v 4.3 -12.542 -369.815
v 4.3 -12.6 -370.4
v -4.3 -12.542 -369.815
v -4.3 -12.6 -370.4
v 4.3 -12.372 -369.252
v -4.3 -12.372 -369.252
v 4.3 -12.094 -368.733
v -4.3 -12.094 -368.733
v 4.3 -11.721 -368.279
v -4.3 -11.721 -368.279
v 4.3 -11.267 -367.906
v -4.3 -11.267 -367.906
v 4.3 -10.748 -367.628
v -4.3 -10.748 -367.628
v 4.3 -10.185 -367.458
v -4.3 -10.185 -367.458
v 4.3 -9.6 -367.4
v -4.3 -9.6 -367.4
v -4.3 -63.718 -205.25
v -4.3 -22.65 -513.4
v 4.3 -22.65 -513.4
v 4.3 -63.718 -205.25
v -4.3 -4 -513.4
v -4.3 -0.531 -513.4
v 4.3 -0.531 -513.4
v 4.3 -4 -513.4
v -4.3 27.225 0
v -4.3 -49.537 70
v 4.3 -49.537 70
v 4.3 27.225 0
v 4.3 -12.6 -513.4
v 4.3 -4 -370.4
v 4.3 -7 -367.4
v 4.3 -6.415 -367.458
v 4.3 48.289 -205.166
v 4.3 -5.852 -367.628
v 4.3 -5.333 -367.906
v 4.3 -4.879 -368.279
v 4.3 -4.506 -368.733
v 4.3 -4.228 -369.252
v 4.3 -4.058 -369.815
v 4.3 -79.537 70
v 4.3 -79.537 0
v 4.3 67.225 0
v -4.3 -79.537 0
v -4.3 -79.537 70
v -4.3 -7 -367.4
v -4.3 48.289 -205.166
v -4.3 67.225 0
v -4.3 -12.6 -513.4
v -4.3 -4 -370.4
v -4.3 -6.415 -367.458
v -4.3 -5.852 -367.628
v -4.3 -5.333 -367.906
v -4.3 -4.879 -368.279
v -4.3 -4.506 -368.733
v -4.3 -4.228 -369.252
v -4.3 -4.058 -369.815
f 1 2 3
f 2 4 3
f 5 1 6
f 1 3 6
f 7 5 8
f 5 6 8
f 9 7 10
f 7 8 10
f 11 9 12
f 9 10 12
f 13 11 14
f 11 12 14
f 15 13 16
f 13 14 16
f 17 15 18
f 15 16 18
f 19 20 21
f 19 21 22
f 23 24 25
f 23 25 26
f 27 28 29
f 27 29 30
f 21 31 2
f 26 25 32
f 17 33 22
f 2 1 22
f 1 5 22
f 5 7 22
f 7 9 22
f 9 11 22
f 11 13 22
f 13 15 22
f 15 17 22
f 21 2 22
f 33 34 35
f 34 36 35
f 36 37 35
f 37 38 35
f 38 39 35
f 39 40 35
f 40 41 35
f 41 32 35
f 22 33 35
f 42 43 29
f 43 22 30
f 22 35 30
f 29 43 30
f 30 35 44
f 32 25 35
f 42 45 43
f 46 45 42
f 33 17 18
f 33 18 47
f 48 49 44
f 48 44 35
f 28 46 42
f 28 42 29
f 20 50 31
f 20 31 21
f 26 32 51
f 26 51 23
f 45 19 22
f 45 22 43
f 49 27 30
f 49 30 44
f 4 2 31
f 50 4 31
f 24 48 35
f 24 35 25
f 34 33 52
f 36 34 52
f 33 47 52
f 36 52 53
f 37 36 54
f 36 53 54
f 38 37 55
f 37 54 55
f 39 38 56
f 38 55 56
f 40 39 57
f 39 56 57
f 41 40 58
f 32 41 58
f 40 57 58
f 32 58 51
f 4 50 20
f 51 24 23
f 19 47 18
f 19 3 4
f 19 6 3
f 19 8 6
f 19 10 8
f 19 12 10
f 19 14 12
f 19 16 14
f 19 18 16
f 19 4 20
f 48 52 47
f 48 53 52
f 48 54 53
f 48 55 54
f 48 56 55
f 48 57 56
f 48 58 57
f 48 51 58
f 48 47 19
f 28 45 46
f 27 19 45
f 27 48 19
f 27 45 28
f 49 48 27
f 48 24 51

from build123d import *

# Parameters (mm, degrees)
BOSS_EXTRUDE1_DEPTH      = 4.3
BOSS_EXTRUDE1_DEPTH_BACK = 4.3
SKETCH3_W                = 152
SKETCH3_H                = 8.6
CUT_EXTRUDE1_DEPTH       = 520.595708462
FILLET1_R                = 3


with BuildPart() as part:
    # Sketch2 → Boss-Extrude1 (new, two sides: drawn at the far end of the back side and taken through both)
    with BuildSketch(Plane(origin=(0, 0, 0), x_dir=(0, 0, -1), z_dir=(1, 0, 0)).offset(-BOSS_EXTRUDE1_DEPTH_BACK)):
        Polygon((0, 67.22485033), (205.165503831, 48.288859026), (513.4, -0.530689138), (513.4, -22.650154351), (205.250409944, -63.717607751), (0, -79.537288439), (-70, -79.537288439), (-70, -49.537288439), (0, 27.22485033), align=None)
    extrude(amount=BOSS_EXTRUDE1_DEPTH + BOSS_EXTRUDE1_DEPTH_BACK)

    # Sketch3 → Cut-Extrude1 (cut, through all)
    with BuildSketch(Plane(origin=(4.3, 0, 0), x_dir=(0, 0, -1), z_dir=(1, 0, 0))):
        with Locations((443.4, -8.3)):
            Rectangle(SKETCH3_W, SKETCH3_H)
    extrude(amount=-CUT_EXTRUDE1_DEPTH, mode=Mode.SUBTRACT)

    # Fillet1
    fillet1_edges = [part.edges().sort_by_distance(p)[0] for p in [
        (0, -12.6, -367.4),
        (0, -4, -367.4),
    ]]
    fillet(fillet1_edges, radius=FILLET1_R)


solid = part.part
